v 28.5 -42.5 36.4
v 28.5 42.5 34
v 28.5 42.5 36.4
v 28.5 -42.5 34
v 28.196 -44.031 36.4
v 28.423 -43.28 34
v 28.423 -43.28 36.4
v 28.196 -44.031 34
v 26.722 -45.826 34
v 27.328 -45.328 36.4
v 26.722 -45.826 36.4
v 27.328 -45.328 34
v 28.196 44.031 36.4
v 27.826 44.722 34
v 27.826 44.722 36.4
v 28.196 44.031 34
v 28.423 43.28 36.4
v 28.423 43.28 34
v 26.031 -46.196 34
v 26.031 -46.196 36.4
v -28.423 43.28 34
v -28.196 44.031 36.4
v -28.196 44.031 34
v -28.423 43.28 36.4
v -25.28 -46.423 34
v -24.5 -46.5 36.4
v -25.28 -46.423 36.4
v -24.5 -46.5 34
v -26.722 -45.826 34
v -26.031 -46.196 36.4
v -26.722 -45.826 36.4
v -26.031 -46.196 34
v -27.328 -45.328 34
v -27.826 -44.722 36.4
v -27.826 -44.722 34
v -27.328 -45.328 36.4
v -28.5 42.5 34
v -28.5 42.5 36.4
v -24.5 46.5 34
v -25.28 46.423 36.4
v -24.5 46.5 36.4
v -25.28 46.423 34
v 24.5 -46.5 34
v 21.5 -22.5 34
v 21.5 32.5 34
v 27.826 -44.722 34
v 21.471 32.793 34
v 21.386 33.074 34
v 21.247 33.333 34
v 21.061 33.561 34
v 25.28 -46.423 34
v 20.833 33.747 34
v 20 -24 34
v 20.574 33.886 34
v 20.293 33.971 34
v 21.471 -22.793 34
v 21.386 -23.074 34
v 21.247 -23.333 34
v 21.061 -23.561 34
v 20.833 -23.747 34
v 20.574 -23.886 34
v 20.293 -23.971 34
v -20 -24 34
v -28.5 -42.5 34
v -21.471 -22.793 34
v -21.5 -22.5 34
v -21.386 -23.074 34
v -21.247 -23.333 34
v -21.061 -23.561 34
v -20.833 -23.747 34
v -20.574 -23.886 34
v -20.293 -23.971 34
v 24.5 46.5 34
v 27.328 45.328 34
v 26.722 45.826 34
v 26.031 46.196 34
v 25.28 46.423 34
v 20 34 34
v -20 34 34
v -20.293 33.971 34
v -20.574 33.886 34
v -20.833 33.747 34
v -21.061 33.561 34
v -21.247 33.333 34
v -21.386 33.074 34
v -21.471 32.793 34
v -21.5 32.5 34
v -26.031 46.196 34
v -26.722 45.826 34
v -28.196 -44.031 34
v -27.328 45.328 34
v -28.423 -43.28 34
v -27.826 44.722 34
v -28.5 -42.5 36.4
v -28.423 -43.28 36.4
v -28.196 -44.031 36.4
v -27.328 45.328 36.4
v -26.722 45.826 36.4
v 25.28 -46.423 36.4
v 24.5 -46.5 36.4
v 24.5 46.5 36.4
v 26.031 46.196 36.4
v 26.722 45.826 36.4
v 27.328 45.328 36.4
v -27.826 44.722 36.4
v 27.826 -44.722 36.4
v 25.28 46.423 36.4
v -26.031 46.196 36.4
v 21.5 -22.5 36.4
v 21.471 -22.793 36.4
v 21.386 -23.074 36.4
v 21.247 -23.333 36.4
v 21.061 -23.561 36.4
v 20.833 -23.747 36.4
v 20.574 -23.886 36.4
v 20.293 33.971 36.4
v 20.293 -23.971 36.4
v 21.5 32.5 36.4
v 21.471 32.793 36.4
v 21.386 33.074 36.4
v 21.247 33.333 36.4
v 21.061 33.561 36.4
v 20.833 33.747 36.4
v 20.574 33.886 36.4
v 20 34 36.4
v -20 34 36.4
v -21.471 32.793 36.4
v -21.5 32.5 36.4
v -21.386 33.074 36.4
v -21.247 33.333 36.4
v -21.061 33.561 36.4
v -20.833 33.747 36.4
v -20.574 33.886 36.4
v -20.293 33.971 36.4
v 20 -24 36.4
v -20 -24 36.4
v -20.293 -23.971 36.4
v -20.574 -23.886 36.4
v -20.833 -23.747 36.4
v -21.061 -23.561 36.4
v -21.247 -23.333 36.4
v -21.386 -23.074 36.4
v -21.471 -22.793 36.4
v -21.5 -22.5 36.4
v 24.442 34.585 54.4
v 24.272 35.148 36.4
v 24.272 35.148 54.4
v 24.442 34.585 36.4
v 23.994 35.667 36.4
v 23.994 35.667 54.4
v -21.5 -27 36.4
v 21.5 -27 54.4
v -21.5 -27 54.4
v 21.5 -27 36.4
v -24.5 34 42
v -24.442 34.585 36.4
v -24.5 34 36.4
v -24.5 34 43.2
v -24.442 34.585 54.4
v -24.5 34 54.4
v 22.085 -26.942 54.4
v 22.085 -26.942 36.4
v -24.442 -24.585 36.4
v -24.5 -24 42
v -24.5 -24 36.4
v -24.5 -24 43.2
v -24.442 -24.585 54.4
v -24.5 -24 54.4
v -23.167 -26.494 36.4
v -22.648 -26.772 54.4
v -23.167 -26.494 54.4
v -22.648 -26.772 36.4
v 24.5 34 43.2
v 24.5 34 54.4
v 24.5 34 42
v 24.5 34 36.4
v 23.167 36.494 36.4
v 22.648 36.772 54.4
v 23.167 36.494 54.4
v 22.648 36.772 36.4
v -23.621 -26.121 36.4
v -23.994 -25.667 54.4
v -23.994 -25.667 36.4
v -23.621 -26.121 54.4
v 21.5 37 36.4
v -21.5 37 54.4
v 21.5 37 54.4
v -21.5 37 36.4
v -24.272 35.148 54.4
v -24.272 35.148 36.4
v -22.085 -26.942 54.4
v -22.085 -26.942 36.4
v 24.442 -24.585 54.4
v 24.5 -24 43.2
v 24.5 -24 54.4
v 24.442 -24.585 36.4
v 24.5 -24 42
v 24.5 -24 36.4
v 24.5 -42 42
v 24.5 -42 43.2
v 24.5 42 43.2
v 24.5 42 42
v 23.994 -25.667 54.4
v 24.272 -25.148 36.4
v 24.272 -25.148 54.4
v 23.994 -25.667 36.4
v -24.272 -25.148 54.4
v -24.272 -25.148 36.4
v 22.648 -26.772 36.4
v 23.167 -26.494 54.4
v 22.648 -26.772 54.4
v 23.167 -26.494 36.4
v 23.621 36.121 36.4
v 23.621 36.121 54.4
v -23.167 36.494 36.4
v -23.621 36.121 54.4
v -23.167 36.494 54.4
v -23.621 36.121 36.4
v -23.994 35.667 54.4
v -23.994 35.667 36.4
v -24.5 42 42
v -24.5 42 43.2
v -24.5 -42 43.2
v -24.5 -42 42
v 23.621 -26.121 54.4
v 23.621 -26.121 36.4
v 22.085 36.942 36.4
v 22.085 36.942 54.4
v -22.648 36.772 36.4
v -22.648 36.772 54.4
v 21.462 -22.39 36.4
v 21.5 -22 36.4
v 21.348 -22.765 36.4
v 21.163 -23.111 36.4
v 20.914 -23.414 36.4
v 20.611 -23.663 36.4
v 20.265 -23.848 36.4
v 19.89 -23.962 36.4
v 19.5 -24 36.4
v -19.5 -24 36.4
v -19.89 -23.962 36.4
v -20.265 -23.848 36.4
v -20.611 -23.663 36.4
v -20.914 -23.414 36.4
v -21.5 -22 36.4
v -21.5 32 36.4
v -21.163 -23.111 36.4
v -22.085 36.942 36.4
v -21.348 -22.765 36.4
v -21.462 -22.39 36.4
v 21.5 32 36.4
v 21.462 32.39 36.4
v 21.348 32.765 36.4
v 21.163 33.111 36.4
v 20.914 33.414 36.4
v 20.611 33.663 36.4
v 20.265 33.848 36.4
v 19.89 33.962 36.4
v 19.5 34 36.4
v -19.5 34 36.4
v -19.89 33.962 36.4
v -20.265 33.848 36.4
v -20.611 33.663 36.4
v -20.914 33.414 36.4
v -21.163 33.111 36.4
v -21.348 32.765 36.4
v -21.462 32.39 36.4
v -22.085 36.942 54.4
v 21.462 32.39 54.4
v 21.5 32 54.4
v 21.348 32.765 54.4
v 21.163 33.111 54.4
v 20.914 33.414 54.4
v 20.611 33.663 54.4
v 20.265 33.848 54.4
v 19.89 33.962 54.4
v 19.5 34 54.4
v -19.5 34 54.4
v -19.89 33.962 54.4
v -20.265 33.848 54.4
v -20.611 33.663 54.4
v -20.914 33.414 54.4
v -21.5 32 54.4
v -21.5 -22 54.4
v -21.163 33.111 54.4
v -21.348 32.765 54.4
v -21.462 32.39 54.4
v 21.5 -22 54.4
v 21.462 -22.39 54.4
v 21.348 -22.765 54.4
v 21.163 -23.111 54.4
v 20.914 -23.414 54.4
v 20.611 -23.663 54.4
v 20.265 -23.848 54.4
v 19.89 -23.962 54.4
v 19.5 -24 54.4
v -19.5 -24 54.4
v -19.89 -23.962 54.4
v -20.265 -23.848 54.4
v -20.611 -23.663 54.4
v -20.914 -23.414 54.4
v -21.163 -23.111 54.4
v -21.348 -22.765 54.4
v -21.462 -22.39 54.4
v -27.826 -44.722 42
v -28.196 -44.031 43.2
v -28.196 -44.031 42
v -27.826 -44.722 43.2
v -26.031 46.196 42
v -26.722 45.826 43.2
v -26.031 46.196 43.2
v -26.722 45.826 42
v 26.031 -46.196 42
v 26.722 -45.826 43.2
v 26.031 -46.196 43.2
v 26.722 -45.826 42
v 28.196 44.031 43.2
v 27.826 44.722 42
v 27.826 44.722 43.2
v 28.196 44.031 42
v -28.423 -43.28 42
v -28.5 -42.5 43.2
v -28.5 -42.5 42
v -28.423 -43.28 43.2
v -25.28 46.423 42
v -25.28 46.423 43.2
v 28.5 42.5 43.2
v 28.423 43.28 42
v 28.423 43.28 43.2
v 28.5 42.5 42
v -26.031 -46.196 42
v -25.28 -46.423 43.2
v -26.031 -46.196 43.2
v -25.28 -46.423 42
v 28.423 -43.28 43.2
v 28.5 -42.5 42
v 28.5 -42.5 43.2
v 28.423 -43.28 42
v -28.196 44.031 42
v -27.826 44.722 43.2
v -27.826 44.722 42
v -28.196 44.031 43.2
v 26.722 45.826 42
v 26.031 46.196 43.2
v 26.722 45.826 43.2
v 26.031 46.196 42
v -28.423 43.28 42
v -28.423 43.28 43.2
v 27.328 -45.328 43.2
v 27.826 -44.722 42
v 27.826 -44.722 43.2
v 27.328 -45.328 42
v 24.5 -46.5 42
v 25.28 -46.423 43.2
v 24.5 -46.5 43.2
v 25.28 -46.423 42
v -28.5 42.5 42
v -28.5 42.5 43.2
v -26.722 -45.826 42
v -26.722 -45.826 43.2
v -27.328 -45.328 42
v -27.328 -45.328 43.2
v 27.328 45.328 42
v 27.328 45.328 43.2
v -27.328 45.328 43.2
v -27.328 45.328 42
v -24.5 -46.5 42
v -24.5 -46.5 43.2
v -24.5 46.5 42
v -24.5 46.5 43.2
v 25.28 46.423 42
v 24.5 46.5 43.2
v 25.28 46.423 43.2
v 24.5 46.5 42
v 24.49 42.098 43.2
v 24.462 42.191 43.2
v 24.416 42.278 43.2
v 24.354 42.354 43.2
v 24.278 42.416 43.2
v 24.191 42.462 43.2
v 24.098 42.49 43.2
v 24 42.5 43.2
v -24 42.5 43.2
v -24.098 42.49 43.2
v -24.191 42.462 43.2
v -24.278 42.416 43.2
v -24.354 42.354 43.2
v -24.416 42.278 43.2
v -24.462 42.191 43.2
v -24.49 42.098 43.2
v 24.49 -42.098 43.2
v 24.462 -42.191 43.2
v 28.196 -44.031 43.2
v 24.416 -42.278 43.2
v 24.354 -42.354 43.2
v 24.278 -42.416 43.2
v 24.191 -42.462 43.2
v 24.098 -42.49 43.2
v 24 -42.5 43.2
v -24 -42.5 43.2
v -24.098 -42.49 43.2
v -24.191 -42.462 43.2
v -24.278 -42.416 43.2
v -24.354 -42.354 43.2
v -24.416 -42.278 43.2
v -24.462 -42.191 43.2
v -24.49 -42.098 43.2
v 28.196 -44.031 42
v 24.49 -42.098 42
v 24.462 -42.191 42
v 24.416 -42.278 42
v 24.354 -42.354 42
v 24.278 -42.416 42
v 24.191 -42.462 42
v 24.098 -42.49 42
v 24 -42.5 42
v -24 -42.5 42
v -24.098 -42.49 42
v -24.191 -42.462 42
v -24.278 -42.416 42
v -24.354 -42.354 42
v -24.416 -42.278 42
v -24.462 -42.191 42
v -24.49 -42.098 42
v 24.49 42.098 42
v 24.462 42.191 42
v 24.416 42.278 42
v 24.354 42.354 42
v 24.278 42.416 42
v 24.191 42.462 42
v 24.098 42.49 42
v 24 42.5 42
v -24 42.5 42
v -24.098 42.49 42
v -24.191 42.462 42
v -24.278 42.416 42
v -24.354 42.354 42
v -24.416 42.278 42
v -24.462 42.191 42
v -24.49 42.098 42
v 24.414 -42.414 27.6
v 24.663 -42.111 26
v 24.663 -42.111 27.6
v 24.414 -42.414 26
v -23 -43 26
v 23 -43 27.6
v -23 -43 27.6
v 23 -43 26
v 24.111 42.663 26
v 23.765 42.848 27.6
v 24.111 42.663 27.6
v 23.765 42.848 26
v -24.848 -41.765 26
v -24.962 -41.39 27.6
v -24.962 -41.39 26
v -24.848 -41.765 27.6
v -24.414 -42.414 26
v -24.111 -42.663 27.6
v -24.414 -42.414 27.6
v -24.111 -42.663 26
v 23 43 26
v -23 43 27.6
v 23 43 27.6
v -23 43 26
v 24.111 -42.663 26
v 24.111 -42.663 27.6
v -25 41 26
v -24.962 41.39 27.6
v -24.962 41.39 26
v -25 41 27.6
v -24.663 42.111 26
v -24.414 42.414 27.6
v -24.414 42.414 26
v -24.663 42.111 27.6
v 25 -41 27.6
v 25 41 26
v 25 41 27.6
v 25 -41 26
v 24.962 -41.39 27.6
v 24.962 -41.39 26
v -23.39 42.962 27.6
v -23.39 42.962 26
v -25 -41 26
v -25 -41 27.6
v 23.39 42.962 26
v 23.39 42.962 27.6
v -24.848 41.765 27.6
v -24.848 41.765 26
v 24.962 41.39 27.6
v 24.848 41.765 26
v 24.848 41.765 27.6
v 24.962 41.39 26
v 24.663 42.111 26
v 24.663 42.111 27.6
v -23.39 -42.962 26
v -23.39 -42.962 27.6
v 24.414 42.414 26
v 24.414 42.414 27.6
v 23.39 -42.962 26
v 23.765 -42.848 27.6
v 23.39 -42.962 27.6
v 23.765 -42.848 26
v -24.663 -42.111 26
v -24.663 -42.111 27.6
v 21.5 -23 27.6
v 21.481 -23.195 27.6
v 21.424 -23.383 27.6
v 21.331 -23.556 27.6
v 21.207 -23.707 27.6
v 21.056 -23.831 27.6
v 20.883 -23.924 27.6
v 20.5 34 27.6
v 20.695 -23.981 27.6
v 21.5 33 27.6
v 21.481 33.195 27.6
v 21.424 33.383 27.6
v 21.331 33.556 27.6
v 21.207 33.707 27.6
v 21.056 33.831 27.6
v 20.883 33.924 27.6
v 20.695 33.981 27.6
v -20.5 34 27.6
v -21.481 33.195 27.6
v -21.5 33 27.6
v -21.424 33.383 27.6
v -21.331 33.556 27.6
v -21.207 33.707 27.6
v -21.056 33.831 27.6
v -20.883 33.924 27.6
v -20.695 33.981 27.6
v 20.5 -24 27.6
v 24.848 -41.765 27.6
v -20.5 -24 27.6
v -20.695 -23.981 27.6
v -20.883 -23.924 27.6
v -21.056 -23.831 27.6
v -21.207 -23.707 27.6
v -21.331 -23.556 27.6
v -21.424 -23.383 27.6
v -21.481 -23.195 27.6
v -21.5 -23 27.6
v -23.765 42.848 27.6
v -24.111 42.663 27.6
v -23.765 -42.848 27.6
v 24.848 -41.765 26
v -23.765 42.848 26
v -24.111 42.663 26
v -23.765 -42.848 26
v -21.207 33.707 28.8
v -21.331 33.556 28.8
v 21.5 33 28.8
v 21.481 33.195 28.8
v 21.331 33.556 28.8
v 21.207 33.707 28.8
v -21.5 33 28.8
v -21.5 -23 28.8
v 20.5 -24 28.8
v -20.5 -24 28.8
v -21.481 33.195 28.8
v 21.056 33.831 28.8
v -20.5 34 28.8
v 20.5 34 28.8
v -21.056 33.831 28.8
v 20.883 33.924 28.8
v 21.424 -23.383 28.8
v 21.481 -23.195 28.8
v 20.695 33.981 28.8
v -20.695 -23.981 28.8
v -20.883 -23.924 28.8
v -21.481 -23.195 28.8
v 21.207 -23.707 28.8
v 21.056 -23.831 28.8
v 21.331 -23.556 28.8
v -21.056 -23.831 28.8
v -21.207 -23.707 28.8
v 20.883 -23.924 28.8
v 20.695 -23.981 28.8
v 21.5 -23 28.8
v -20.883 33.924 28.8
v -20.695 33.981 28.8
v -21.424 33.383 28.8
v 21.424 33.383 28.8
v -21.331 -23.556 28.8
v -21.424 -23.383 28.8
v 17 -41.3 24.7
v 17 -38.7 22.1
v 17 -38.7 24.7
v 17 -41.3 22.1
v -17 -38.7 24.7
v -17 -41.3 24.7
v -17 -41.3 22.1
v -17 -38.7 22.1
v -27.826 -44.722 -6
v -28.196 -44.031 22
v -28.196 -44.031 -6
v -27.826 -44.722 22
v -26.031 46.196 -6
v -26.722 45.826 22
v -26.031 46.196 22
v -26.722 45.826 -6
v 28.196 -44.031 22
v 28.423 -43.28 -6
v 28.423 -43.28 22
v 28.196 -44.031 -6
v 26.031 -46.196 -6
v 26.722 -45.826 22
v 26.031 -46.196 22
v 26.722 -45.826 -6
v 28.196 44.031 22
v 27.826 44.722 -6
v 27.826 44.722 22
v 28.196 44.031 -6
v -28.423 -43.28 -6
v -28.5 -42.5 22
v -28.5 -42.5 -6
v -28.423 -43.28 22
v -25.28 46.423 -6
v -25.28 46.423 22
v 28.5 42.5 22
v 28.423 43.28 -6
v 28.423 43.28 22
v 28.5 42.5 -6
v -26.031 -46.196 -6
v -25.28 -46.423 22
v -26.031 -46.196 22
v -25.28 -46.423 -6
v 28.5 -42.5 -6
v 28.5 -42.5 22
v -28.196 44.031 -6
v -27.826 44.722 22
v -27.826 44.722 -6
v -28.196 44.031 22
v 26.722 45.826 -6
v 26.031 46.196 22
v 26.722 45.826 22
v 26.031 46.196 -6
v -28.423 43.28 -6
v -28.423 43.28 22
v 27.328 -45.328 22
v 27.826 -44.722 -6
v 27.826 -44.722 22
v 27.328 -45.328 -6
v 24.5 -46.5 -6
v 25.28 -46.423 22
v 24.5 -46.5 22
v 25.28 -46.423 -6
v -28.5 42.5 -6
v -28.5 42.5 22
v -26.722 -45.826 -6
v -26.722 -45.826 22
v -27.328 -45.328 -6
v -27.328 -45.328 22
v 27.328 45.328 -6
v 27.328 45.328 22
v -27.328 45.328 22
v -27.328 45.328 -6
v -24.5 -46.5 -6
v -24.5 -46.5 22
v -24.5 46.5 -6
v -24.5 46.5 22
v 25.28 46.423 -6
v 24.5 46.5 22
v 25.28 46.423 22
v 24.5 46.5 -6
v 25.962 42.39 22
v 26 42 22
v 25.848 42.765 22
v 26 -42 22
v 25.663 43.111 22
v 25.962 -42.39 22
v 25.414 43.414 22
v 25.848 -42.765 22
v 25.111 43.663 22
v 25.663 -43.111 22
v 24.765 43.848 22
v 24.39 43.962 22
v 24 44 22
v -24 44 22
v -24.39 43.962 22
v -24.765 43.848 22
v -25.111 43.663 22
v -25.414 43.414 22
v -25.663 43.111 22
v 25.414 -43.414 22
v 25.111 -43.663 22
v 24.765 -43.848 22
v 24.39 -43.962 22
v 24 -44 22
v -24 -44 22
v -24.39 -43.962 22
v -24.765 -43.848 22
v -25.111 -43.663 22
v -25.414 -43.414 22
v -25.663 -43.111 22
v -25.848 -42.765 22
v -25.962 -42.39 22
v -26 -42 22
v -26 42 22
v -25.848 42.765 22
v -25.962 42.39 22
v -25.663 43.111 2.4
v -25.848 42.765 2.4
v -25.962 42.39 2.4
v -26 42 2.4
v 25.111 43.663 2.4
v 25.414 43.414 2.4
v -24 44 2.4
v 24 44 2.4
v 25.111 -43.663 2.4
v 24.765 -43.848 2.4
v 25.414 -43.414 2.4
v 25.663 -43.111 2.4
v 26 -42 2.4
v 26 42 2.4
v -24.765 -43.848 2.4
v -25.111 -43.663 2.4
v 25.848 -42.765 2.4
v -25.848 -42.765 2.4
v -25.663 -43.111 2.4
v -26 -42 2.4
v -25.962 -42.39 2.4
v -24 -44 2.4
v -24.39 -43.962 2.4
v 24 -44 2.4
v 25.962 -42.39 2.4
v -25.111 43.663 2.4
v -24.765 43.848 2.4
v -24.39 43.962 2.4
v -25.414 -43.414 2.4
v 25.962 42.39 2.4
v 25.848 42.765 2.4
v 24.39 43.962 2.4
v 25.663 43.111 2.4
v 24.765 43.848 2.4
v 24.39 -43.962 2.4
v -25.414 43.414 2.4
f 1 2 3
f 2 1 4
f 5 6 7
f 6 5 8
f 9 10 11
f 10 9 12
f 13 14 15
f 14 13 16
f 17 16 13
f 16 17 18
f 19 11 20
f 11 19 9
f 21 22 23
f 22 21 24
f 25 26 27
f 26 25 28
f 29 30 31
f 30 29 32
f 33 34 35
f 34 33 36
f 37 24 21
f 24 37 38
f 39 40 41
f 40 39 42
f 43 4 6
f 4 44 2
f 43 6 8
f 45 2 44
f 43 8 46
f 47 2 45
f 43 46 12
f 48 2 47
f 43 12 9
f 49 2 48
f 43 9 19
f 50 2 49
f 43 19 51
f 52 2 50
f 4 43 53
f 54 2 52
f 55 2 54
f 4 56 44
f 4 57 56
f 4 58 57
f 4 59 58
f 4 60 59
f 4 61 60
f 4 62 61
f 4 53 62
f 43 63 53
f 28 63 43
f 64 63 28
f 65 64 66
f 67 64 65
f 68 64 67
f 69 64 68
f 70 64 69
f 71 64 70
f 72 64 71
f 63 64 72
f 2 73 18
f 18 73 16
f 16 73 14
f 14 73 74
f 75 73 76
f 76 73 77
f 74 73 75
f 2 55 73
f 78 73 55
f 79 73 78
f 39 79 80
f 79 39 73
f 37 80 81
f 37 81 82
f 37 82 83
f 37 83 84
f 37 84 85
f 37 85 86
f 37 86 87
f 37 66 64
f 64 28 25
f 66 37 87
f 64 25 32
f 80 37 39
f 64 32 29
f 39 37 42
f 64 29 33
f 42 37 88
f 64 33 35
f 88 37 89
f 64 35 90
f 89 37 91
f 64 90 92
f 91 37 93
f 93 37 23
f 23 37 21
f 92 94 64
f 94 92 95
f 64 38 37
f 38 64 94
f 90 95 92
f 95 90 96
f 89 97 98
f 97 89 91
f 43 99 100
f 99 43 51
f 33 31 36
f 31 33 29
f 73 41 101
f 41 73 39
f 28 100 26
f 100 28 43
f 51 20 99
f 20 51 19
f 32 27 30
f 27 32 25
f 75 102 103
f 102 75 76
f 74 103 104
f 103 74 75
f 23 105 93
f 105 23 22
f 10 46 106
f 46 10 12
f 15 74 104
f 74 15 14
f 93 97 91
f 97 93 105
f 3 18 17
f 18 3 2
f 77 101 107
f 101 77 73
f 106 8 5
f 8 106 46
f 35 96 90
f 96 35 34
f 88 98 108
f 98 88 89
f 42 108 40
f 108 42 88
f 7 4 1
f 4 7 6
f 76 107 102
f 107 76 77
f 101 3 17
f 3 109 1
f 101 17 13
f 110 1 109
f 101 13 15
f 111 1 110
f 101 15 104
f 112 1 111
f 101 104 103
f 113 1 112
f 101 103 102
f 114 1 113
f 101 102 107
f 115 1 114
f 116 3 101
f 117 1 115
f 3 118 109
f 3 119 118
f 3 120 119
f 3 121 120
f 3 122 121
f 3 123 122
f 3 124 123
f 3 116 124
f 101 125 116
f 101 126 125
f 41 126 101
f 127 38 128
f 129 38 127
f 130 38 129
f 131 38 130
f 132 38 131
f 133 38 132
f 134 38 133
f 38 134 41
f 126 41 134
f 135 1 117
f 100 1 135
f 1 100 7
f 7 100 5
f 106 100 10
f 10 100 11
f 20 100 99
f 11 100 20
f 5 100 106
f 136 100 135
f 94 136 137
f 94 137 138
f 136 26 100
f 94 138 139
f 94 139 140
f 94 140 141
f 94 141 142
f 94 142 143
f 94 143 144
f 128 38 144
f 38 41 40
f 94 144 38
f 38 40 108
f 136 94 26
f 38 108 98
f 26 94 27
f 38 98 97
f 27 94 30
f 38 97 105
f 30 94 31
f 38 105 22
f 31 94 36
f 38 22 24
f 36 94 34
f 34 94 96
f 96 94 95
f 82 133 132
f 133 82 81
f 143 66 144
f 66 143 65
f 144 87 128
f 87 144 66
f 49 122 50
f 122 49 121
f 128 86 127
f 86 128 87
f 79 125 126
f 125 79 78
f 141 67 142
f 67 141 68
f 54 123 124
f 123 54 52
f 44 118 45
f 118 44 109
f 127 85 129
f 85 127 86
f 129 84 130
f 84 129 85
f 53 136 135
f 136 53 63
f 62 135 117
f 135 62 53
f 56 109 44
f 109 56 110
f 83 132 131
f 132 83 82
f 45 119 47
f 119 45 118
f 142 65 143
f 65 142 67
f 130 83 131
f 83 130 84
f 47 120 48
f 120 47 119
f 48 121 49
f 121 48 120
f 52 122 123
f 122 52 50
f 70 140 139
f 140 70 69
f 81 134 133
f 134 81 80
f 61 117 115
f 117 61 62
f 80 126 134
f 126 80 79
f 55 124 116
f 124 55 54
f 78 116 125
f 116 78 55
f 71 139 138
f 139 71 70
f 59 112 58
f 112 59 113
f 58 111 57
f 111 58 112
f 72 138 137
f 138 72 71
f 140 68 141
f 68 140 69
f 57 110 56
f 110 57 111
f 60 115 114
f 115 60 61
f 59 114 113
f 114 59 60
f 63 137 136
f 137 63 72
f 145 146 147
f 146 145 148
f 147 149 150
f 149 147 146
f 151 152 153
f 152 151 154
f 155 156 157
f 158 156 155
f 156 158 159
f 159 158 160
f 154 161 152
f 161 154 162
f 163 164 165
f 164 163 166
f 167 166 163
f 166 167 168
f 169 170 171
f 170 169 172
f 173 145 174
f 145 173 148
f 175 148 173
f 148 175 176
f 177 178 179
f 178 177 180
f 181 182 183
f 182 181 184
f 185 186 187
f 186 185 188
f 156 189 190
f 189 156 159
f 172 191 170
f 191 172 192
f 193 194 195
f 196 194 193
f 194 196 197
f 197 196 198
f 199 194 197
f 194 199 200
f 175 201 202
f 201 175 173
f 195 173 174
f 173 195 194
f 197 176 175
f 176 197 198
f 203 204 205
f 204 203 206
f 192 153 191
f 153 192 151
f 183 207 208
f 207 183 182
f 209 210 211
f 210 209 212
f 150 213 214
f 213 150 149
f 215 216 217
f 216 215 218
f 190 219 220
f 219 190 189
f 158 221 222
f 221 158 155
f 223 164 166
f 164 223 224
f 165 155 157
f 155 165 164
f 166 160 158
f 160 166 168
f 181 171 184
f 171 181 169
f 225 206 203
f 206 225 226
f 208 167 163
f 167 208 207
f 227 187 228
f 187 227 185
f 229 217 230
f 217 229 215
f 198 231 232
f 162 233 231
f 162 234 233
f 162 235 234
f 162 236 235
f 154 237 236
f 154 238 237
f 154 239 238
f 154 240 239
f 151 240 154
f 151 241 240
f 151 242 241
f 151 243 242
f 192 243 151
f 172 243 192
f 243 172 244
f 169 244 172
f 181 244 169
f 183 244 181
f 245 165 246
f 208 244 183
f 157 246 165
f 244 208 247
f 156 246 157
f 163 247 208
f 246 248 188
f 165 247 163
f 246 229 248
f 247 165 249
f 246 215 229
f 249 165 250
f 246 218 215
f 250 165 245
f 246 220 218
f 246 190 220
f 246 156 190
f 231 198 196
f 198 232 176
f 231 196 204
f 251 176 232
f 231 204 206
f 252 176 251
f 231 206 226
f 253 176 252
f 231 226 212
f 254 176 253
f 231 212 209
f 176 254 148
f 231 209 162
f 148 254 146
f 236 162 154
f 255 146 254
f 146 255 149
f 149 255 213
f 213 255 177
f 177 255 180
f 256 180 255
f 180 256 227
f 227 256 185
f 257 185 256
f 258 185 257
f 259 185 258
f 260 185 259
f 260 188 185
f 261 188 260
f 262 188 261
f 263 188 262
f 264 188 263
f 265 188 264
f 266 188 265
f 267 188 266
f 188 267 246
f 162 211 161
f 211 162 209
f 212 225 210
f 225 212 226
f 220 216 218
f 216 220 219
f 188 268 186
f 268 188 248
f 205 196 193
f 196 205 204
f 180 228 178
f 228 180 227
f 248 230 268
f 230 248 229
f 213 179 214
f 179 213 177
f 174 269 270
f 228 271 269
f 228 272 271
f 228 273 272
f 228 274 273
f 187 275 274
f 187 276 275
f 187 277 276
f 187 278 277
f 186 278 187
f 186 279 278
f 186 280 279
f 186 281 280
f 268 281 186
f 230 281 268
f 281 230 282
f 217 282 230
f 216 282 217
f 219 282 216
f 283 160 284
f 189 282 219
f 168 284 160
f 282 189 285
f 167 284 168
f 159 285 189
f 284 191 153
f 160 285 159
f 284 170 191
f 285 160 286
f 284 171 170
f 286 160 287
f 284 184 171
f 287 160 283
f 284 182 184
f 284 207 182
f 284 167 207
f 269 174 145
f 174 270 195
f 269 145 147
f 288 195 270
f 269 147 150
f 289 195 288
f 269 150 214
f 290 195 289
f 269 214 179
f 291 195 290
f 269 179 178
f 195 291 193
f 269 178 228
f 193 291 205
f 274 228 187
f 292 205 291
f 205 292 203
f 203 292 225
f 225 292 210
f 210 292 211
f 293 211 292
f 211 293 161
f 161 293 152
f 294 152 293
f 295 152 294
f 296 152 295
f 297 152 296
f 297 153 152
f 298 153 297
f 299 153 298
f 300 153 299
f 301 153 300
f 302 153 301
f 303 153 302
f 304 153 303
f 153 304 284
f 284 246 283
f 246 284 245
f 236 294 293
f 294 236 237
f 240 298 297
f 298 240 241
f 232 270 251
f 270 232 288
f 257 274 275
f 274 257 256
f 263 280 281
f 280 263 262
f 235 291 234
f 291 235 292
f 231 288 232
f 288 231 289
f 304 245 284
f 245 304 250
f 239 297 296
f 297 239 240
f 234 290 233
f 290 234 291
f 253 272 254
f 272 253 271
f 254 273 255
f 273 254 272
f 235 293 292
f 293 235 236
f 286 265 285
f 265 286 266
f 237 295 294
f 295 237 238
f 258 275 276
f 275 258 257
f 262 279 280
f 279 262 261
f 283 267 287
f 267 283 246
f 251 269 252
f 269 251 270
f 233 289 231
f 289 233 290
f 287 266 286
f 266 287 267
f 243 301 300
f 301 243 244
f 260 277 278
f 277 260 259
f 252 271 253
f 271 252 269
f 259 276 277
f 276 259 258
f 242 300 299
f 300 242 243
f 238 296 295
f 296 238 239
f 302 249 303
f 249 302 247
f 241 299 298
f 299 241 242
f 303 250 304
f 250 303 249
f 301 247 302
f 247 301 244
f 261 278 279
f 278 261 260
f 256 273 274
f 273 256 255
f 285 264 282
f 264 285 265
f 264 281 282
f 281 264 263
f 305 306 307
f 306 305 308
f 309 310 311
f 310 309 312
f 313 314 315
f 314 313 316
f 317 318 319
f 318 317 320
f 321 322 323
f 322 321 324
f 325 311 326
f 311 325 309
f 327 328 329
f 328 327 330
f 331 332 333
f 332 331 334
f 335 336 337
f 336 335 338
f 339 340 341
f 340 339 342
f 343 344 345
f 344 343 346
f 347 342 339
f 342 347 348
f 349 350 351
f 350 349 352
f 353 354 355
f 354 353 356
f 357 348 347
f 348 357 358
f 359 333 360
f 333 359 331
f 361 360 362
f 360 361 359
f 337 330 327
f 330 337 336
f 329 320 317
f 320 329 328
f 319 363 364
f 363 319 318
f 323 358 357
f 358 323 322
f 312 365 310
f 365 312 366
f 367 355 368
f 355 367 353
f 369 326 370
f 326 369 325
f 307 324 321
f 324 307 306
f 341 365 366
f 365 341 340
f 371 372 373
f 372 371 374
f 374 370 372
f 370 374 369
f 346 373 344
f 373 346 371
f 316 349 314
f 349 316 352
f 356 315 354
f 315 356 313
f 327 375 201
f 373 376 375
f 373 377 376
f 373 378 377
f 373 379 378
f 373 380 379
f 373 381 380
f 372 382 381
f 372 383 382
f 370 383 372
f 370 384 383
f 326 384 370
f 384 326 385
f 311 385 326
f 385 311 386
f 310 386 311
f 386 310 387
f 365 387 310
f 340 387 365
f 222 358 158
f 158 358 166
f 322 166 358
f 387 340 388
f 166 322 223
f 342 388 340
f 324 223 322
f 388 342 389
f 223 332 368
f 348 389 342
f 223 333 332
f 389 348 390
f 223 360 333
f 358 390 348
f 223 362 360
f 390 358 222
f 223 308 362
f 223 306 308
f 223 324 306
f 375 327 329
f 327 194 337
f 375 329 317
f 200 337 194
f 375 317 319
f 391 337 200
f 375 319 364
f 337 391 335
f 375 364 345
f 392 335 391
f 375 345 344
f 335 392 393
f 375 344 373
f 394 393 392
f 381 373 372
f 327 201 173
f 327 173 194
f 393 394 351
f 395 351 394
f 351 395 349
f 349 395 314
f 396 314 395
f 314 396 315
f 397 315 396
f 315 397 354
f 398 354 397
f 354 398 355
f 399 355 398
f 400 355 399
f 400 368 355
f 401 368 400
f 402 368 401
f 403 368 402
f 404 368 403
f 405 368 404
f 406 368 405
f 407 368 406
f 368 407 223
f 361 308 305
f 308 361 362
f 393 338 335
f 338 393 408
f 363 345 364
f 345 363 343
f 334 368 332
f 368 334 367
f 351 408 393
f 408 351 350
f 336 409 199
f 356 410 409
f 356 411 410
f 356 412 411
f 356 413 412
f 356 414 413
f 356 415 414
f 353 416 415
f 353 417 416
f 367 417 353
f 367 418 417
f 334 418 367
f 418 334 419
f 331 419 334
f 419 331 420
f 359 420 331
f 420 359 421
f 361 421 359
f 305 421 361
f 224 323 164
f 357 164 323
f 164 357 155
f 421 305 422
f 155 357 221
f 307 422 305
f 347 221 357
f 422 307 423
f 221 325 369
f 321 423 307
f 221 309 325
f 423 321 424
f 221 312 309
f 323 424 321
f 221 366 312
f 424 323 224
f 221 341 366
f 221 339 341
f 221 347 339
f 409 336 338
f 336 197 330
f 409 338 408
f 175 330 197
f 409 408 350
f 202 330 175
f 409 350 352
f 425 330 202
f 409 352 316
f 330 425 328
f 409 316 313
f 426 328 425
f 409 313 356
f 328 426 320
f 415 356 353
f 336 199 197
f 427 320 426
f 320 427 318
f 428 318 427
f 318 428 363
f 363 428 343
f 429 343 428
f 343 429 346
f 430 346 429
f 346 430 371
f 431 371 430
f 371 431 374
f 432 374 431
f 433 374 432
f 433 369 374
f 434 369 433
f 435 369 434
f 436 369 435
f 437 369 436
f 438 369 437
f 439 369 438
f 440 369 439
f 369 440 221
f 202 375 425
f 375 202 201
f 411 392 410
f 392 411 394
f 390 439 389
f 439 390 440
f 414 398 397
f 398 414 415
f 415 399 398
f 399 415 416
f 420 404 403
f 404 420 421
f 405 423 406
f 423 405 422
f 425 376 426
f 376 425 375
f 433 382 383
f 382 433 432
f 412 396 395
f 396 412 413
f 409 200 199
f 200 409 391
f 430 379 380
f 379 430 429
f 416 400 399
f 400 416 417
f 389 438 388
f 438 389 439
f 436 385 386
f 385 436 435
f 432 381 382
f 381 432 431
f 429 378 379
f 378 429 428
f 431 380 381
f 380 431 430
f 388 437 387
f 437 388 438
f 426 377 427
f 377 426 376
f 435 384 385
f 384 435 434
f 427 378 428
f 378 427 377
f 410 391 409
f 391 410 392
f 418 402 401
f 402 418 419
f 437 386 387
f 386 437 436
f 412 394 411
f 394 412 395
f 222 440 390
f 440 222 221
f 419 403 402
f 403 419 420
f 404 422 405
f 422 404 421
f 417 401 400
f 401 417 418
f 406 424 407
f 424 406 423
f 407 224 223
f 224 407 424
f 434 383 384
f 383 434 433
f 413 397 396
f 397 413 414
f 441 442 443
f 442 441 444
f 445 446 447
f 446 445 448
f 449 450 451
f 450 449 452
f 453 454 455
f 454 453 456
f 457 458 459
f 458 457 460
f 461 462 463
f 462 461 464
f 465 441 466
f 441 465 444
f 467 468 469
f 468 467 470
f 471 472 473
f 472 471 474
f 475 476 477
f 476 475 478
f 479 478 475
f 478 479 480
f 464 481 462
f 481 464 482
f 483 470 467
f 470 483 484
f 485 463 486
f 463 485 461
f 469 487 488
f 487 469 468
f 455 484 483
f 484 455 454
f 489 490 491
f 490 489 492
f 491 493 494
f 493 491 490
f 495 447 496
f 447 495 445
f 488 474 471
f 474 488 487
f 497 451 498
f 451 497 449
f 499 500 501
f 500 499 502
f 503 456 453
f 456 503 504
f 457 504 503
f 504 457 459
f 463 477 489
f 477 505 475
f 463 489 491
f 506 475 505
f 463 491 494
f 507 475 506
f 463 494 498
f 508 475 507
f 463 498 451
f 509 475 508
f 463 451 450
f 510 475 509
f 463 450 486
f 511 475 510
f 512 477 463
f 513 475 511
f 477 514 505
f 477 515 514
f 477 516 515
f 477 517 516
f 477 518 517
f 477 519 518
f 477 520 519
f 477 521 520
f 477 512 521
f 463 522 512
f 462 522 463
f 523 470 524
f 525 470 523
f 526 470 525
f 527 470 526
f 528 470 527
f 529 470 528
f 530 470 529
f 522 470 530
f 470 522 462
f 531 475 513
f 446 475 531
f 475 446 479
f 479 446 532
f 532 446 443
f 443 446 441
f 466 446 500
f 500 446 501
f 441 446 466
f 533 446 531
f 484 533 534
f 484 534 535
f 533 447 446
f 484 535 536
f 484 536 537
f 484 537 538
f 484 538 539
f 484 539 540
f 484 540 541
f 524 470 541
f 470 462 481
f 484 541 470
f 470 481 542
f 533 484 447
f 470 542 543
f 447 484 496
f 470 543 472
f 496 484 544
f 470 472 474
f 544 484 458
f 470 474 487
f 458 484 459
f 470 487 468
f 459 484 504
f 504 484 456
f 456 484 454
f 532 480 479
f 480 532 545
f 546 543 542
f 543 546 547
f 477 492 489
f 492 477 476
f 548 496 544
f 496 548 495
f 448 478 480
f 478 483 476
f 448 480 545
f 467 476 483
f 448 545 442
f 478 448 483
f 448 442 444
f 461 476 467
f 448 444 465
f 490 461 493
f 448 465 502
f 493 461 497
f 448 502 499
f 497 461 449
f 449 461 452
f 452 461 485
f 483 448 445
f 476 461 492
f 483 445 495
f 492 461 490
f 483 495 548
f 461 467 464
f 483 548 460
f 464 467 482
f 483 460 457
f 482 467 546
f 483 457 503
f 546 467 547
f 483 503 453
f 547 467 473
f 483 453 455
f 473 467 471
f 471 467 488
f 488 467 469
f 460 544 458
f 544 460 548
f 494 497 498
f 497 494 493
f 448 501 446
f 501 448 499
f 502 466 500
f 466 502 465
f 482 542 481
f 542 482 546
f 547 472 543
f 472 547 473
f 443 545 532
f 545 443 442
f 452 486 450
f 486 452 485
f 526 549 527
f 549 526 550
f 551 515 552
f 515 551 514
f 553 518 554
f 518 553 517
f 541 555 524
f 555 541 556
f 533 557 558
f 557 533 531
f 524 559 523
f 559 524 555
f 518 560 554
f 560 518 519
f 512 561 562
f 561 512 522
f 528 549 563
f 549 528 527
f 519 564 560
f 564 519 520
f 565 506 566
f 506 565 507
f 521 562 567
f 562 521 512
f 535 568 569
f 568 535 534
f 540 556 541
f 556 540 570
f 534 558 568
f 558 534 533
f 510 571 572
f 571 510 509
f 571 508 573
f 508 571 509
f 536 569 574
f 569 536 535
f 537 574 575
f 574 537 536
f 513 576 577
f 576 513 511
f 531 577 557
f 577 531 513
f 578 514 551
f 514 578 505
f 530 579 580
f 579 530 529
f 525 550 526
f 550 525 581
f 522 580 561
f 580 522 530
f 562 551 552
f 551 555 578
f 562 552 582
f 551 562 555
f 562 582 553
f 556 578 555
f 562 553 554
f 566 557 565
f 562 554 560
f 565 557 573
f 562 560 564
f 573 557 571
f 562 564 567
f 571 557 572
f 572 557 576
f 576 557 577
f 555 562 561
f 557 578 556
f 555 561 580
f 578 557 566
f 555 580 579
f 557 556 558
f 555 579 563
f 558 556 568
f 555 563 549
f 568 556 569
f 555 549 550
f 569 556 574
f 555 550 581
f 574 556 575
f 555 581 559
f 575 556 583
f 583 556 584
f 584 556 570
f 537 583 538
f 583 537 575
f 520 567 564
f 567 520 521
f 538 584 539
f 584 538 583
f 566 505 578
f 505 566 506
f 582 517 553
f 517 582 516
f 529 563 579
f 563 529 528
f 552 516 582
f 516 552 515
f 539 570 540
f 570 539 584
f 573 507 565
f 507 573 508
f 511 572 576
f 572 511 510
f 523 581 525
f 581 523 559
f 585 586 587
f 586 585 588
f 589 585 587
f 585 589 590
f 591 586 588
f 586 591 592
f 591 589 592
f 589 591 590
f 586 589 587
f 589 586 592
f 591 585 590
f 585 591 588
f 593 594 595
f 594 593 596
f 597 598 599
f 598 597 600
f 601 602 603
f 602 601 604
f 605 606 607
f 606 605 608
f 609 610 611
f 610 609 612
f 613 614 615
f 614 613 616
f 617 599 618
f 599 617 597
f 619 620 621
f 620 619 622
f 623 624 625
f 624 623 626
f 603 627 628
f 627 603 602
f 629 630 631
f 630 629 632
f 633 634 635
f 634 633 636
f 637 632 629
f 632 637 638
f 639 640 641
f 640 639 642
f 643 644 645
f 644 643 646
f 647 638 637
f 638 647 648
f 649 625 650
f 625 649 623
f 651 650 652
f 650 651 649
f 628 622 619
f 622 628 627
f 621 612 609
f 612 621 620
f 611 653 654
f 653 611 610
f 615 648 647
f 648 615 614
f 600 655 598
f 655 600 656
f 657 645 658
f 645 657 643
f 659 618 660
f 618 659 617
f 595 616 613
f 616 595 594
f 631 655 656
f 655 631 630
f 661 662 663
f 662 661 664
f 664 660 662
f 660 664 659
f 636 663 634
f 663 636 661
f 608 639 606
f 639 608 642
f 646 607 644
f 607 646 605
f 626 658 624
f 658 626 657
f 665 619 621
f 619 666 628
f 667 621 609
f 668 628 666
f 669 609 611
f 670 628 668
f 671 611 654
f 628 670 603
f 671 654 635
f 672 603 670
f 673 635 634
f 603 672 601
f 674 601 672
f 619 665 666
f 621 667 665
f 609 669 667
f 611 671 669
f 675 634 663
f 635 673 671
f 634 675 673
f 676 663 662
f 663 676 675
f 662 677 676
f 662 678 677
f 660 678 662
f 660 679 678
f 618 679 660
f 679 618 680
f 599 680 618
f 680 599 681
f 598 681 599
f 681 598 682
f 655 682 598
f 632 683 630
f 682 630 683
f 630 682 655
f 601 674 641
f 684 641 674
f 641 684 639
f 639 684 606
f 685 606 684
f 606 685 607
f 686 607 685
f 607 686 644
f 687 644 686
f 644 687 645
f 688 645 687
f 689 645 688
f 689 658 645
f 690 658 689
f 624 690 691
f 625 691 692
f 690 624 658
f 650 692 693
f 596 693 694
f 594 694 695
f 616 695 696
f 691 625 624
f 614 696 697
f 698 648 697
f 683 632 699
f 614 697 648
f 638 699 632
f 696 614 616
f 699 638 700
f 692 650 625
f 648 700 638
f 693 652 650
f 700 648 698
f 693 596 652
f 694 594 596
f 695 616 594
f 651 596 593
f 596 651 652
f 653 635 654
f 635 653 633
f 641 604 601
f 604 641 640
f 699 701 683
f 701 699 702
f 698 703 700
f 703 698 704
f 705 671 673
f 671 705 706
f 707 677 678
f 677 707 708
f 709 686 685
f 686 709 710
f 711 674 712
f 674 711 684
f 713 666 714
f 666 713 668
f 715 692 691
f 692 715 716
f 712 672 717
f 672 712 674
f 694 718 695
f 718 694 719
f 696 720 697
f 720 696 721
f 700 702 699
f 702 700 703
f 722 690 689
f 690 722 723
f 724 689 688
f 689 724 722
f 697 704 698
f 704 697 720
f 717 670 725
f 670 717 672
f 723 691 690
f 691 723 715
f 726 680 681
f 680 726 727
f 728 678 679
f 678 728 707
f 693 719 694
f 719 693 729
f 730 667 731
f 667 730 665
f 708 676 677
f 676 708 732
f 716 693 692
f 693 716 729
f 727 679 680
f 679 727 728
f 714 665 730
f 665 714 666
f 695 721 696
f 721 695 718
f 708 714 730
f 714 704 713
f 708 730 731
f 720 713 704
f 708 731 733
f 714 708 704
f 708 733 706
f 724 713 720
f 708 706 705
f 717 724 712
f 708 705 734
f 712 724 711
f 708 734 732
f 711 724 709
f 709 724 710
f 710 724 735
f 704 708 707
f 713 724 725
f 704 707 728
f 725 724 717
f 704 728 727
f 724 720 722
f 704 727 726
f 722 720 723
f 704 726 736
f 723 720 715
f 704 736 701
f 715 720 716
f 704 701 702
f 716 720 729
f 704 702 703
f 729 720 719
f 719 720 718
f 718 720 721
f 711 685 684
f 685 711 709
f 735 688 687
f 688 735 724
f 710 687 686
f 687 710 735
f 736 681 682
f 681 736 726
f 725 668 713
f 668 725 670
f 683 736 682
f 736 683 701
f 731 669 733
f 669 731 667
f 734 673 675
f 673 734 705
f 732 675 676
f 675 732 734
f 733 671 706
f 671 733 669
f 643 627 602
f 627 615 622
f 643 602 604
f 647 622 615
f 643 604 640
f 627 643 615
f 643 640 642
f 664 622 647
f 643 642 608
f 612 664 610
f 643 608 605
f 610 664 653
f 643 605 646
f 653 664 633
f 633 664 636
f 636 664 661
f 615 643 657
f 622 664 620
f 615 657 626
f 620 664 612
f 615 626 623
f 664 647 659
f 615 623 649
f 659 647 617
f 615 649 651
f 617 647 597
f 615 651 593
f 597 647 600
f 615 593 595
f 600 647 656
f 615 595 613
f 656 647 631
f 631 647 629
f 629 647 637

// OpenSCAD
/*
  concept_compare.scad - NOT A PRINTABLE PART.

  A picture, built to answer one question: should the case open at the FRONT
  (where the screen is) or at the BACK (where the mount is)?

  Everything here is deliberately simplified. Real geometry lives in case.scad.
  The only thing this file is trying to get right is WHERE THE RED RING IS,
  because the red ring is the sealing line and its position is the whole
  decision.

  Render:
    openscad -o a.png --imgsize=1400,1100 --camera=... -D 'opt="A"' concept_compare.scad
    opt = "A"  front-opening  (what case.scad does today)
    opt = "B"  back-opening   (what the seal review recommends)
*/

$fn = 32;
opt = "A";
X   = 1;    // explode multiplier; 0 assembles it

// ---- shared sizes, near enough to the real thing ----
W   = 57;   L  = 93;   // case outline, option A
Wb  = 64;   Lb = 100;  // case outline, option B (wider flange for a real seal)
DW  = 50;   DL = 86;   // display module
AW  = 43;   AL = 58;   // active glass

module rr(w, l, h, r = 4) {
    hull() for (x = [-1, 1], y = [-1, 1])
        translate([x * (w/2 - r), y * (l/2 - r)]) cylinder(h = h, r = r);
}

// The display module: green PCB, black glass, a header stub on one edge.
module display() {
    color("#2E5548") rr(DW, DL, 1.6, 2);
    color("#12181A") translate([0, 5, 1.6]) rr(AW, AL, 1.2, 1);
    color("#C08A46") translate([0, -DL/2 + 3, -2.6]) cube([34, 2.6, 2.6], center = true);
}

// The sealing line. This is the point of the whole drawing.
module seal_ring(w, l, r = 4) {
    color("#C4342A")
    difference() {
        rr(w, l, 1.2, r);
        translate([0, 0, -0.5]) rr(w - 8, l - 8, 2.2, max(0.5, r - 4));
    }
}

module hood(w, l, d) {
    color("#23282B")
    difference() {
        rr(w + 6, l + 6, d, 3);
        translate([0, 0, -1]) rr(w, l, d + 2, 2);
    }
}

// ============================================================ OPTION A

/*
  Front-opening. The tub faces the rider; the lid carries the window and the
  hood; the seal ring therefore runs right around the display glass - the
  hardest place on the whole case to seal, and the place where any error shows
  as cropped picture.
*/
module option_A() {
    // hood + lid, lifted off
    translate([0, 0, 34 * X]) {
        color("#B9C2C0") difference() {
            rr(W, L, 2.4);
            translate([0, 5, -1]) rr(AW, AL, 5, 1.5);    // the aperture
        }
        translate([0, 5, 2.4]) hood(AW, AL, 18);
    }
    // THE SEAL - up at the top of the tub, encircling the window
    translate([0, 0, 22 + 20 * X]) seal_ring(W, L);
    // display, dropped in from the front
    translate([0, 0, 16 + 10 * X]) display();
    // the tub
    color("#9AA6AB") difference() {
        rr(W, L, 22);
        translate([0, 0, 2.4]) rr(W - 5, L - 5, 22, 2);
    }
    // mount pad, moulded into the closed back
    color("#6E7B80") translate([0, 0, -6]) rr(W, L, 6);
}

// ============================================================ OPTION B

/*
  Back-opening. The front is a permanently closed bezel with the panel bonded
  behind it; the lid is a plain plate on the mount side. The seal ring moves to
  a flat rim with nothing near it, the screw bosses move out of the display's
  way, and the aperture moves into a separate 5 g frame that can be reprinted
  if the measurement turns out wrong.
*/
module option_B() {
    /*
      Drawn SCREEN-UP, exactly like option A, so the two pictures compare
      directly. The difference you are looking for is which way the parts come
      apart: in A they lift off the front, in B they come off the back.
    */
    // body: closed front wall on TOP, cavity opening downward
    color("#9AA6AB") difference() {
        translate([0, 0, -24]) rr(Wb, Lb, 24);
        translate([0, 0, -24]) rr(Wb - 12, Lb - 12, 21, 2);  // cavity opens down
        translate([0, 5, -4]) rr(48, 74, 6, 2);              // window opening
    }
    // hood on the front, outside the sealed volume, bolted on
    translate([0, 5, 20 * X]) hood(AW, AL, 18);

    // the reprintable bezel frame - every unverified number lives in this part
    translate([0, 0, -5 + 9 * X]) {
        color("#23282B") difference() {
            rr(52, 88, 1.5, 2);
            translate([0, 5, -1]) rr(47, 62, 4, 1.5);
        }
    }
    // display, bonded up behind the frame
    translate([0, 0, -8 - 3 * X]) display();

    // THE SEAL - on a plain flat rim at the BACK, nothing near it
    translate([0, 0, -26 - 14 * X]) seal_ring(Wb, Lb, 7);
    // plain lid, no window, no hood, nothing to line up
    translate([0, 0, -32 - 22 * X]) color("#B9C2C0") rr(Wb, Lb, 5, 7);
    // mount plate, bolted to the outside of the lid
    translate([0, 0, -40 - 30 * X]) color("#6E7B80") rr(Wb, Lb, 6, 7);
}

// ============================================================ LAYOUT

if (opt == "A") option_A();
else            option_B();
